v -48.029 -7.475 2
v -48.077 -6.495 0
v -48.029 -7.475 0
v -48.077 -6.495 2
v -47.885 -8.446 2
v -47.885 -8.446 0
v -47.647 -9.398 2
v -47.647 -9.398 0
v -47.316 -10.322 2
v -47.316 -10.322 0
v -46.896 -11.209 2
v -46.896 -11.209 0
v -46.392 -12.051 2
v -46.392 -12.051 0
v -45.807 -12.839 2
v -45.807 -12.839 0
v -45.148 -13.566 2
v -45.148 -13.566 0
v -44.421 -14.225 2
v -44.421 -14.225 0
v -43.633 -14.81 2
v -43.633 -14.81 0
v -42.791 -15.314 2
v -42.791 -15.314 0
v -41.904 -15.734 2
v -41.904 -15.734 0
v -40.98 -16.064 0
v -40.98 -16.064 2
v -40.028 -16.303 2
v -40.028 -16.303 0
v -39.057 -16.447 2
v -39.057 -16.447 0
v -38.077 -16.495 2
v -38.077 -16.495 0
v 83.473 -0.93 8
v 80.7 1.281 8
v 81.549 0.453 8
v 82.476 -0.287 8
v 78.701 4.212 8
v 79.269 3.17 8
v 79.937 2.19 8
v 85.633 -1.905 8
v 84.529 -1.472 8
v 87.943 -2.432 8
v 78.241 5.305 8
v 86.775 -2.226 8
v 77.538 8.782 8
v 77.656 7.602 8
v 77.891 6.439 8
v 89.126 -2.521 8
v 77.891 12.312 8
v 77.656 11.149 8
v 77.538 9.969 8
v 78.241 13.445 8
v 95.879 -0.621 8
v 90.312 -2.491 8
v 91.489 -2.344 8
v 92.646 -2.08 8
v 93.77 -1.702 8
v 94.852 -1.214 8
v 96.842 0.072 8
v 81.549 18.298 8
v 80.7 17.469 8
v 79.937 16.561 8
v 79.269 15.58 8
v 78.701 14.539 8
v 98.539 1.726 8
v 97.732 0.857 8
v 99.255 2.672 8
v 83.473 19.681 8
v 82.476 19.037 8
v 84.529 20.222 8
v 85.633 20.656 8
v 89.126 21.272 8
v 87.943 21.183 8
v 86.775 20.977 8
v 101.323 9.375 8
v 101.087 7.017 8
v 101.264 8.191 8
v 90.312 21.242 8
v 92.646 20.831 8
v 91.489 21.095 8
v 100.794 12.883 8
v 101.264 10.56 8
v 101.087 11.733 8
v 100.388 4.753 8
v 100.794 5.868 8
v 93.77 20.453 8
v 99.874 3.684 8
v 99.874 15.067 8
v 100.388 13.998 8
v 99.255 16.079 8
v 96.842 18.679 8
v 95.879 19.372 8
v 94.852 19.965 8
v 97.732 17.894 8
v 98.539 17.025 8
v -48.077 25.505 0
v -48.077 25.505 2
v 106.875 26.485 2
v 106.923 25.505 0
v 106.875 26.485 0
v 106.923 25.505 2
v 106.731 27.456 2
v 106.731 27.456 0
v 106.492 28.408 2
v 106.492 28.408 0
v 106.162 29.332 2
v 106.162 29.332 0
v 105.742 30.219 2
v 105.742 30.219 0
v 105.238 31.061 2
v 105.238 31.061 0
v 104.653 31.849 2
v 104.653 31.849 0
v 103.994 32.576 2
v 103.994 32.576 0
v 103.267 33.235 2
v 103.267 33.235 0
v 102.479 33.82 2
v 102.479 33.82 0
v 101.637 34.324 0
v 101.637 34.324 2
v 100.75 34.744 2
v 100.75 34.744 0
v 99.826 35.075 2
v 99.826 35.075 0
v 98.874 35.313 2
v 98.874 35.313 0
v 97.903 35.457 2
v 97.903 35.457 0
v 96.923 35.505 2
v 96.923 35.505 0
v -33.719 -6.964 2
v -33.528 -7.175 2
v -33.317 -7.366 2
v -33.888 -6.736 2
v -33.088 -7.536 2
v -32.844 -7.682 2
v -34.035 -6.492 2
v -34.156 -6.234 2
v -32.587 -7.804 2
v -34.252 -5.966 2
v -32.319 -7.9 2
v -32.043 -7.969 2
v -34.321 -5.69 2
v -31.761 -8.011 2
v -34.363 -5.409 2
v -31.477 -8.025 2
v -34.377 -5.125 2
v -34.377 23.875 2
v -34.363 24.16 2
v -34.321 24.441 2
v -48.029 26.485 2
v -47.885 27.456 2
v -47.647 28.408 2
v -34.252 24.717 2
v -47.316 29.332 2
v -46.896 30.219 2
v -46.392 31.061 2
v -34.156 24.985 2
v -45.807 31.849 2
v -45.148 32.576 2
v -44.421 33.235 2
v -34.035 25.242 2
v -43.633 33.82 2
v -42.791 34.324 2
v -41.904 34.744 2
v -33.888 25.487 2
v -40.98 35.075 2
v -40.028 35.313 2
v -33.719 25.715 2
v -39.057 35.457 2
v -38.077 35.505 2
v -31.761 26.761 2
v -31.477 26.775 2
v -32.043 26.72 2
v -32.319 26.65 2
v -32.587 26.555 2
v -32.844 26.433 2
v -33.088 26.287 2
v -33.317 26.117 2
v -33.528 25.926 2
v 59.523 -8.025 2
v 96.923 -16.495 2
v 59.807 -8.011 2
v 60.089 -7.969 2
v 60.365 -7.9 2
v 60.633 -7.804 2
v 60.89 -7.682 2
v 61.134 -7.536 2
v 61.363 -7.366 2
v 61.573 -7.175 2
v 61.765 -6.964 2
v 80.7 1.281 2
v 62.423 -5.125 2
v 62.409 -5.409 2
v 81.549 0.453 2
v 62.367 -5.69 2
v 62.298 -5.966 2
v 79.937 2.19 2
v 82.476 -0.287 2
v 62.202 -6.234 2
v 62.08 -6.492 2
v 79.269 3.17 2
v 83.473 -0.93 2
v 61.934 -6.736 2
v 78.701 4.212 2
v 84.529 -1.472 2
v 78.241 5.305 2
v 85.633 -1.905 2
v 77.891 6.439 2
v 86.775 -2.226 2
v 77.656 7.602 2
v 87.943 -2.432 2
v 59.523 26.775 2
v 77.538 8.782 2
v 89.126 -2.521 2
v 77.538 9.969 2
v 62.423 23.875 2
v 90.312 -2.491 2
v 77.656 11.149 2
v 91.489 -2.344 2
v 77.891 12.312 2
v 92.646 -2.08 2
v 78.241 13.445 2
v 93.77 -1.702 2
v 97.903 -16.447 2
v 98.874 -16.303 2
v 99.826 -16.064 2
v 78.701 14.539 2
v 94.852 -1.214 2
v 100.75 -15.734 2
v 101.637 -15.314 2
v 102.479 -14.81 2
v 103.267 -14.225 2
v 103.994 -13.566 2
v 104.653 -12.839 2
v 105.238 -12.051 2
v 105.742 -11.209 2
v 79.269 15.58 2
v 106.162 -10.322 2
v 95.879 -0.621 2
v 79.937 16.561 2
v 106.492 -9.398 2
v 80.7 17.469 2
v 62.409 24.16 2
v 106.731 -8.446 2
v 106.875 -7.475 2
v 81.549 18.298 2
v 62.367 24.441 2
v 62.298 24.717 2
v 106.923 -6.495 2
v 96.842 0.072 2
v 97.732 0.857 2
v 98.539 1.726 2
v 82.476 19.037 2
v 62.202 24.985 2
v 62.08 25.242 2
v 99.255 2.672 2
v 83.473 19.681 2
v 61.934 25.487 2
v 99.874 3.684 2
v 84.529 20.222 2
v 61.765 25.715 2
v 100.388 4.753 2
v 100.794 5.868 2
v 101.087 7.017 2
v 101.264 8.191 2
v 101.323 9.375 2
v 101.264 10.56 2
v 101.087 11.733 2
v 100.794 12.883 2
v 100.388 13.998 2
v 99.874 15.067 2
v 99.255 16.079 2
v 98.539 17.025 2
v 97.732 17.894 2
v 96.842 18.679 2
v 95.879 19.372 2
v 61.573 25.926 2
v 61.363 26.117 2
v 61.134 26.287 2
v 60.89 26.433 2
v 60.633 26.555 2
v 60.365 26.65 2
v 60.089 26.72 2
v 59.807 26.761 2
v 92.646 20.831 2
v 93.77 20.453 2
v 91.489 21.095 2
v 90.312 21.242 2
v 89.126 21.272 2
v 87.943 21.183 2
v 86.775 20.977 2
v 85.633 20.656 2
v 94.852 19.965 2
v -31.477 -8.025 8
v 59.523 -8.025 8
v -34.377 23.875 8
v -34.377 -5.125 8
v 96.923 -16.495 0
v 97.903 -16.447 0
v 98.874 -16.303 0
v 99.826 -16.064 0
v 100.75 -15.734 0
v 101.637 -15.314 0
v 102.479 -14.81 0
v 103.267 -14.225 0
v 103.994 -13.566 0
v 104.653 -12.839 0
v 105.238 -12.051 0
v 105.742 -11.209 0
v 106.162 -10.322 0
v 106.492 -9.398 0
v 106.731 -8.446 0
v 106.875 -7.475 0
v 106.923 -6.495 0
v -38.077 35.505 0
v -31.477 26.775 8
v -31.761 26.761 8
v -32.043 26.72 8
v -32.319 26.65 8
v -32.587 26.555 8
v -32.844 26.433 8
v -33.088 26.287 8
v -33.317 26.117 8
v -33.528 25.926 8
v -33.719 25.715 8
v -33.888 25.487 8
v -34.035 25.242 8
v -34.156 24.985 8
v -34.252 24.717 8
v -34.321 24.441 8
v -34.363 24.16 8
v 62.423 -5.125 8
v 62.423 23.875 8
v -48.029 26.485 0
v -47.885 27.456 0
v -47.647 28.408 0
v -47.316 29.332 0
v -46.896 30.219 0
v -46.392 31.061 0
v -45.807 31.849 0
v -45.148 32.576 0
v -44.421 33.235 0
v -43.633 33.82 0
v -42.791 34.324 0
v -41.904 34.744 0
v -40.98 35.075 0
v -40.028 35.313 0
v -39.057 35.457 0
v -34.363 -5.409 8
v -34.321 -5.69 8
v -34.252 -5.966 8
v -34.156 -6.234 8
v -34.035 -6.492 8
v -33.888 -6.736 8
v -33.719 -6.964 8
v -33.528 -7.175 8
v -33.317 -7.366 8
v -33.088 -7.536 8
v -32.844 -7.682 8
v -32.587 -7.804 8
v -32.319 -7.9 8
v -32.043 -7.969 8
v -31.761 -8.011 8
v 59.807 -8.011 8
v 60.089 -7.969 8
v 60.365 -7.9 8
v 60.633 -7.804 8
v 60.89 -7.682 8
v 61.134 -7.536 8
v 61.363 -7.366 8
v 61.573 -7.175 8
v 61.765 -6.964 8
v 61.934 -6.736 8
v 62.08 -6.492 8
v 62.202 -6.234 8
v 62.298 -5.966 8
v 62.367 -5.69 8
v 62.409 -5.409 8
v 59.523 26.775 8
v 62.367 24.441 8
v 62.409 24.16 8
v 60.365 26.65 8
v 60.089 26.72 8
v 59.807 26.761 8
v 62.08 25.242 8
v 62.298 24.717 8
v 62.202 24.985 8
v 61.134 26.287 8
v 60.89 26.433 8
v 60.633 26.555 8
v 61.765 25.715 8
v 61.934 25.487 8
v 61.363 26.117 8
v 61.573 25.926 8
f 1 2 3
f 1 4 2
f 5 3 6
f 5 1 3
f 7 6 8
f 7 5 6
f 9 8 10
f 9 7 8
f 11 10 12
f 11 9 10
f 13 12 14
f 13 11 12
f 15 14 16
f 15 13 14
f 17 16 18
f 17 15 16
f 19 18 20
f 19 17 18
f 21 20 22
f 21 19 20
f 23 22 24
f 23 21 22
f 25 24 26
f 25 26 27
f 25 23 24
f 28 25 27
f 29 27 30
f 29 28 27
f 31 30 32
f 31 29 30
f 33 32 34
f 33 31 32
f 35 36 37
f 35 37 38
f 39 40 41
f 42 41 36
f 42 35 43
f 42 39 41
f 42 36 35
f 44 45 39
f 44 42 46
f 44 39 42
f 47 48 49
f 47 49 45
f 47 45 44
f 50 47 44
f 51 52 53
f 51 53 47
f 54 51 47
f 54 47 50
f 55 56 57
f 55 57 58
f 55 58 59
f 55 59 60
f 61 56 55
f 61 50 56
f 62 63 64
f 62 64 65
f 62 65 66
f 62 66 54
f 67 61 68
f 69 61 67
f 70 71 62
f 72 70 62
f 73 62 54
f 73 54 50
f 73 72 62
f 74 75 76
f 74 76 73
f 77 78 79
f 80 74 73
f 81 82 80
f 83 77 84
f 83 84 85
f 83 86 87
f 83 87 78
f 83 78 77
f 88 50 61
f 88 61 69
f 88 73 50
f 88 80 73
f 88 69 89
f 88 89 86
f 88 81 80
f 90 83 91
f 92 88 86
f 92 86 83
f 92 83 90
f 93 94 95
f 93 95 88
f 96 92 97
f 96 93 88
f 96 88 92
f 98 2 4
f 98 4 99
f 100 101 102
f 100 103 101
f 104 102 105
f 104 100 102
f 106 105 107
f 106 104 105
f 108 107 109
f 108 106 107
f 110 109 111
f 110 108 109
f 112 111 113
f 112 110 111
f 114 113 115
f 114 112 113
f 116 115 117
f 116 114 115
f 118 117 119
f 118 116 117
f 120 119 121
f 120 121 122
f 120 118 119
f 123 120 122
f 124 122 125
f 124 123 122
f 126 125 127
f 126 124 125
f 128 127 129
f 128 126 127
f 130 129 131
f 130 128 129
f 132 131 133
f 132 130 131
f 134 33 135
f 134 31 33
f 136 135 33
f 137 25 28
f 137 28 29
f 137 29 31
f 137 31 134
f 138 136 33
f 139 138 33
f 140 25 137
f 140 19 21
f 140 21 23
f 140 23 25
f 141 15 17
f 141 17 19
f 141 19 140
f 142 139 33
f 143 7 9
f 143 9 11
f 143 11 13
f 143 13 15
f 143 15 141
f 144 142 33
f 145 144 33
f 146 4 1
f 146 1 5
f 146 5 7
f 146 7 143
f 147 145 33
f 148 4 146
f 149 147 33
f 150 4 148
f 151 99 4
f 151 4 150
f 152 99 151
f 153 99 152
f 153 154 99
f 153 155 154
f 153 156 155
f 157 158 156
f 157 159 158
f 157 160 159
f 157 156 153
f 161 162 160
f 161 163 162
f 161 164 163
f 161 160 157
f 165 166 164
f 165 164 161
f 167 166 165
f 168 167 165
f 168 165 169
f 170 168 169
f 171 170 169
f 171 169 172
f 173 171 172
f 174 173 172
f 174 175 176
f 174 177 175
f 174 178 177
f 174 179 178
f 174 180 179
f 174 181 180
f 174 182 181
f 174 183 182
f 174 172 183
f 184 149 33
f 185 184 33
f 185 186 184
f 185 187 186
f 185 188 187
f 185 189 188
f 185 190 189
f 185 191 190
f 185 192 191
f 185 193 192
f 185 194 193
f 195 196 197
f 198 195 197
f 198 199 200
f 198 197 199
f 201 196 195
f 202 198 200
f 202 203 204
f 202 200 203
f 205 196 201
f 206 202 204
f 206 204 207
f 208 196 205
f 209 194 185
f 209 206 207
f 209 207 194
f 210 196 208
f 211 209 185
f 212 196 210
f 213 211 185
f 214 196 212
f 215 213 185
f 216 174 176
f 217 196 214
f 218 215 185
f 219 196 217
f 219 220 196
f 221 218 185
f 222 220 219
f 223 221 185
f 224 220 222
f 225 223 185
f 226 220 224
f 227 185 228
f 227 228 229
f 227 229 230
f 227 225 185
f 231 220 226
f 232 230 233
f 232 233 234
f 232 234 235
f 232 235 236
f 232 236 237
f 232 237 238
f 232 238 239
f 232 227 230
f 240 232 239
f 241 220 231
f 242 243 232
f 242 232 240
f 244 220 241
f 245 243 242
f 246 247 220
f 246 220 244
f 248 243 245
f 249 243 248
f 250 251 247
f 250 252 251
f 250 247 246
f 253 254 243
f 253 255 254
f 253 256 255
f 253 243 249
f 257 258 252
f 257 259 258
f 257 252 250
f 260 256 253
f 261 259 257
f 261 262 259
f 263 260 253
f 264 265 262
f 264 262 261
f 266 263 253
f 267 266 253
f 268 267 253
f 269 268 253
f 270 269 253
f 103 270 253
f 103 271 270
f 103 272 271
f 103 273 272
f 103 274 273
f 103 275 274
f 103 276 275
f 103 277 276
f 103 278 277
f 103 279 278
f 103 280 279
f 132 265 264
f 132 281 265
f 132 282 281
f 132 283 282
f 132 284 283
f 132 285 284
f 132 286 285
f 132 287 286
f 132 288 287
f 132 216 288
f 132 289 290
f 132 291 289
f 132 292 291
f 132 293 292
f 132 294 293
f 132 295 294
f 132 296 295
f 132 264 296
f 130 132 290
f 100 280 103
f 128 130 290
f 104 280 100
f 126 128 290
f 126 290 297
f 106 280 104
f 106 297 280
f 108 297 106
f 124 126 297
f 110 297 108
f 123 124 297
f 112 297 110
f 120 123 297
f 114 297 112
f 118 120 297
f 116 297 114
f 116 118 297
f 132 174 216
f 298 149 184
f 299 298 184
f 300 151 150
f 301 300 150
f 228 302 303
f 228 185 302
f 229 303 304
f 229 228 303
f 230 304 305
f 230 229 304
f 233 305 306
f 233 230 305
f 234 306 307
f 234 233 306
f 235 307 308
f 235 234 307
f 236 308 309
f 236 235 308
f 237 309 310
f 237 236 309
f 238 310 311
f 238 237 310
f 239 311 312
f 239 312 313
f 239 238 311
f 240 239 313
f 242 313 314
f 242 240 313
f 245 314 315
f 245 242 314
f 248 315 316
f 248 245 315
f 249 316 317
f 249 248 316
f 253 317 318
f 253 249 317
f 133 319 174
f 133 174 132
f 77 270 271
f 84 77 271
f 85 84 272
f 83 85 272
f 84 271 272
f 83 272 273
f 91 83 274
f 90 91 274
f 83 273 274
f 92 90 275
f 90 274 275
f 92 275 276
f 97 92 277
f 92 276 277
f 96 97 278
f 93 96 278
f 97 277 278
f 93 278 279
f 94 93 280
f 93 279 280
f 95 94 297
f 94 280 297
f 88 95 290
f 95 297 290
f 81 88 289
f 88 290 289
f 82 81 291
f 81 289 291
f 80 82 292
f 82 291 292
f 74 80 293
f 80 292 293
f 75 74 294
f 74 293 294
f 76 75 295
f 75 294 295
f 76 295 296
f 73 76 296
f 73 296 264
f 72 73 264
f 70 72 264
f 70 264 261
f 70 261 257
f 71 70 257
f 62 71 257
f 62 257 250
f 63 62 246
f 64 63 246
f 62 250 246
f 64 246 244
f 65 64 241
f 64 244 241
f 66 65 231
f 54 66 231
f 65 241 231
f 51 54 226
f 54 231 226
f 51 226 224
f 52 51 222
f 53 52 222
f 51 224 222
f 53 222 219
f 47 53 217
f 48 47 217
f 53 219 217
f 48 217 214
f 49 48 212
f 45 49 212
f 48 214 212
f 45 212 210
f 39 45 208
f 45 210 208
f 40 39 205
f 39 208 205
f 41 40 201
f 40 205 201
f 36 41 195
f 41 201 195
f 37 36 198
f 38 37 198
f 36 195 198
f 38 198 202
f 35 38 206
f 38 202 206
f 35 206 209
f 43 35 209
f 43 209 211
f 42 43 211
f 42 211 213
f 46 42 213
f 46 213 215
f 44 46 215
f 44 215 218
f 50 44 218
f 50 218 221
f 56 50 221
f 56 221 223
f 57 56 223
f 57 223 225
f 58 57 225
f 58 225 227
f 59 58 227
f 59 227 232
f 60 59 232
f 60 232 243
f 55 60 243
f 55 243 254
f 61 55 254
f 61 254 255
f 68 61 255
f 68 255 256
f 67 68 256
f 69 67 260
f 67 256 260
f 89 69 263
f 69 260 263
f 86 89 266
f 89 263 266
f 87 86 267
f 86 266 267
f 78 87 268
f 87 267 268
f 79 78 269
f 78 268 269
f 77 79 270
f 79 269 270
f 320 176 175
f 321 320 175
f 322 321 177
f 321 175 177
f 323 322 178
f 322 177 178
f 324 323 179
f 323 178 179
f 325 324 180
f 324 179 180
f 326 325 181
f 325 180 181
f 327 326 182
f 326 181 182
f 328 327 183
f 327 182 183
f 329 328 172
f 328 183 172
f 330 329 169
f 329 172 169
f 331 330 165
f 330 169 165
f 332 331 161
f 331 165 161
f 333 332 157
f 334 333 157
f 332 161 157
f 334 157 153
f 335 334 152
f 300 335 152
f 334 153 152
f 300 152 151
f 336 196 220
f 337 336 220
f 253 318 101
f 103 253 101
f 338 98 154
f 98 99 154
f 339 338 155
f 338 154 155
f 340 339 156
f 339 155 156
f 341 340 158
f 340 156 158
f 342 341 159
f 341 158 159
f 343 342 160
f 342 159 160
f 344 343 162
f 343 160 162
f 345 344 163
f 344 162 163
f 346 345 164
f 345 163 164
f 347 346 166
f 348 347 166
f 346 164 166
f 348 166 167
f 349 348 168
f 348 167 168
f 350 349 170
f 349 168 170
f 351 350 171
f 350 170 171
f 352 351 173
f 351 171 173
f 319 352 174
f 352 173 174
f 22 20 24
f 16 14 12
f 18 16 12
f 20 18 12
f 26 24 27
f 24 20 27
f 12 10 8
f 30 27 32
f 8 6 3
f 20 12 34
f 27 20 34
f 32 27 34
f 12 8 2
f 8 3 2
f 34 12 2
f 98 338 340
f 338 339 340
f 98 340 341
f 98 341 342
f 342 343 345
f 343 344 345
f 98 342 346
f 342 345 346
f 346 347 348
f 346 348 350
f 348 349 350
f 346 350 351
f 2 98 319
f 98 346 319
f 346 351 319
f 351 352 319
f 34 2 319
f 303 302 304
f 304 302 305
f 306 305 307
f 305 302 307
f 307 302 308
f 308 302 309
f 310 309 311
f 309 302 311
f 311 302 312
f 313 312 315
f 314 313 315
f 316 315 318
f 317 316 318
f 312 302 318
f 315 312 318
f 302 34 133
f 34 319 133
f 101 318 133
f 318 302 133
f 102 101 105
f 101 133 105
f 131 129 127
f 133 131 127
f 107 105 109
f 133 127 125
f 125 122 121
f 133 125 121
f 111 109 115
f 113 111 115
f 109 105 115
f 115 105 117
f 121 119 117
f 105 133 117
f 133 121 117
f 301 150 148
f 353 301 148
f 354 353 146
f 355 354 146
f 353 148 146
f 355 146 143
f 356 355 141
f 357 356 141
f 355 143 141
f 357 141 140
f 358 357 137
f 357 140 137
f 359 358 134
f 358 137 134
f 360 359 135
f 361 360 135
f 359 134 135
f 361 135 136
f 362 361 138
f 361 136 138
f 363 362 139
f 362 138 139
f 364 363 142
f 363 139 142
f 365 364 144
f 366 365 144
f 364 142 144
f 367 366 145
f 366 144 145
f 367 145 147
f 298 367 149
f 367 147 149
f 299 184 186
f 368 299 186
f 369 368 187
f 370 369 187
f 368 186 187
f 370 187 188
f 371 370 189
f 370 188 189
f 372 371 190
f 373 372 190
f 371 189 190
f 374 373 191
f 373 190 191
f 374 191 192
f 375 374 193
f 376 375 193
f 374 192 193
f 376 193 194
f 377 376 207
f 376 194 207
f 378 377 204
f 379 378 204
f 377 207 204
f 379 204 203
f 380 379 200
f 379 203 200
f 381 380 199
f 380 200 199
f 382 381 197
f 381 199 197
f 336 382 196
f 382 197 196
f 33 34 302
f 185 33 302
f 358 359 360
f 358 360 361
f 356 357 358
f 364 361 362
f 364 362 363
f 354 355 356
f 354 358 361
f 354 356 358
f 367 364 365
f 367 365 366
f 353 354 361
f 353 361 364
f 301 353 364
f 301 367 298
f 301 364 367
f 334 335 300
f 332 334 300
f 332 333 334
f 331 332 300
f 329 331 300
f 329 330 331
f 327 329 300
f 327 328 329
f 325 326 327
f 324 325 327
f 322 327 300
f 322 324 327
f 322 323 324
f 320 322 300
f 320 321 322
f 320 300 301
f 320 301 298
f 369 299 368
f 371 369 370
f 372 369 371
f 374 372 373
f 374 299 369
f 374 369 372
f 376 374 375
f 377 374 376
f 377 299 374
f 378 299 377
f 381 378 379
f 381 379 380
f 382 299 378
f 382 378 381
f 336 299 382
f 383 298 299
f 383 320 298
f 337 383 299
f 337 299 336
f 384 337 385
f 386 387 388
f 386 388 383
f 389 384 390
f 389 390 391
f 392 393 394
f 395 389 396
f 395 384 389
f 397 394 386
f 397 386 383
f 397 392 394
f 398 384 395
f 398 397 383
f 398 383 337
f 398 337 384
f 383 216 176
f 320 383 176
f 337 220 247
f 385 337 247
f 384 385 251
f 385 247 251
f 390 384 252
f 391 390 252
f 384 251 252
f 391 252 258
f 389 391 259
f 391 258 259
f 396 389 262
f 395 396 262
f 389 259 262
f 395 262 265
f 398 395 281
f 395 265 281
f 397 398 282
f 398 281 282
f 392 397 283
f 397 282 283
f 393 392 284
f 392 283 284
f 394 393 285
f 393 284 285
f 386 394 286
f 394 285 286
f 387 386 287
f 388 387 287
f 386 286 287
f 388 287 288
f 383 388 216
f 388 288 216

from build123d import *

# Parameters (mm, degrees)
ESQUISSE1_W        = 155
ESQUISSE1_H        = 52
BOSS_EXTRU_1_DEPTH = 2
CONG_1_R           = 10
ESQUISSE2_R        = 11.9
BOSS_EXTRU_2_DEPTH = 6


with BuildPart() as part:
    # Esquisse1 → Boss.-Extru.1 (new body)
    with BuildSketch(Plane.XY):
        with Locations((29.422862753, 9.505149502)):
            Rectangle(ESQUISSE1_W, ESQUISSE1_H)
    extrude(amount=BOSS_EXTRU_1_DEPTH)

    # Congé1
    cong_1_edges = [part.edges().sort_by_distance(p)[0] for p in [
        (-48.077137247, 35.505149502, 1),
        (106.922862753, 35.505149502, 1),
        (106.922862753, -16.494850498, 1),
        (-48.077137247, -16.494850498, 1),
    ]]
    fillet(cong_1_edges, radius=CONG_1_R)

    # Esquisse2 → Boss.-Extru.2 (add)
    with BuildSketch(Plane.XY.offset(2)):
        with Locations((89.422862753, 9.375368795)):
            Circle(ESQUISSE2_R)
        with BuildLine():
            Line((-31.477137247, -8.024631205), (59.522862753, -8.024631205))
            ThreePointArc((59.522862753, -8.024631205), (61.573472418, -7.17524087), (62.422862753, -5.124631205))
            Line((62.422862753, -5.124631205), (62.422862753, 23.875368795))
            ThreePointArc((62.422862753, 23.875368795), (61.573472418, 25.925978461), (59.522862753, 26.775368795))
            Line((59.522862753, 26.775368795), (-31.477137247, 26.775368795))
            ThreePointArc((-31.477137247, 26.775368795), (-33.527746913, 25.925978461), (-34.377137247, 23.875368795))
            Line((-34.377137247, 23.875368795), (-34.377137247, -5.124631205))
            ThreePointArc((-34.377137247, -5.124631205), (-33.527746913, -7.17524087), (-31.477137247, -8.024631205))
        make_face()
    extrude(amount=BOSS_EXTRU_2_DEPTH)


solid = part.part
